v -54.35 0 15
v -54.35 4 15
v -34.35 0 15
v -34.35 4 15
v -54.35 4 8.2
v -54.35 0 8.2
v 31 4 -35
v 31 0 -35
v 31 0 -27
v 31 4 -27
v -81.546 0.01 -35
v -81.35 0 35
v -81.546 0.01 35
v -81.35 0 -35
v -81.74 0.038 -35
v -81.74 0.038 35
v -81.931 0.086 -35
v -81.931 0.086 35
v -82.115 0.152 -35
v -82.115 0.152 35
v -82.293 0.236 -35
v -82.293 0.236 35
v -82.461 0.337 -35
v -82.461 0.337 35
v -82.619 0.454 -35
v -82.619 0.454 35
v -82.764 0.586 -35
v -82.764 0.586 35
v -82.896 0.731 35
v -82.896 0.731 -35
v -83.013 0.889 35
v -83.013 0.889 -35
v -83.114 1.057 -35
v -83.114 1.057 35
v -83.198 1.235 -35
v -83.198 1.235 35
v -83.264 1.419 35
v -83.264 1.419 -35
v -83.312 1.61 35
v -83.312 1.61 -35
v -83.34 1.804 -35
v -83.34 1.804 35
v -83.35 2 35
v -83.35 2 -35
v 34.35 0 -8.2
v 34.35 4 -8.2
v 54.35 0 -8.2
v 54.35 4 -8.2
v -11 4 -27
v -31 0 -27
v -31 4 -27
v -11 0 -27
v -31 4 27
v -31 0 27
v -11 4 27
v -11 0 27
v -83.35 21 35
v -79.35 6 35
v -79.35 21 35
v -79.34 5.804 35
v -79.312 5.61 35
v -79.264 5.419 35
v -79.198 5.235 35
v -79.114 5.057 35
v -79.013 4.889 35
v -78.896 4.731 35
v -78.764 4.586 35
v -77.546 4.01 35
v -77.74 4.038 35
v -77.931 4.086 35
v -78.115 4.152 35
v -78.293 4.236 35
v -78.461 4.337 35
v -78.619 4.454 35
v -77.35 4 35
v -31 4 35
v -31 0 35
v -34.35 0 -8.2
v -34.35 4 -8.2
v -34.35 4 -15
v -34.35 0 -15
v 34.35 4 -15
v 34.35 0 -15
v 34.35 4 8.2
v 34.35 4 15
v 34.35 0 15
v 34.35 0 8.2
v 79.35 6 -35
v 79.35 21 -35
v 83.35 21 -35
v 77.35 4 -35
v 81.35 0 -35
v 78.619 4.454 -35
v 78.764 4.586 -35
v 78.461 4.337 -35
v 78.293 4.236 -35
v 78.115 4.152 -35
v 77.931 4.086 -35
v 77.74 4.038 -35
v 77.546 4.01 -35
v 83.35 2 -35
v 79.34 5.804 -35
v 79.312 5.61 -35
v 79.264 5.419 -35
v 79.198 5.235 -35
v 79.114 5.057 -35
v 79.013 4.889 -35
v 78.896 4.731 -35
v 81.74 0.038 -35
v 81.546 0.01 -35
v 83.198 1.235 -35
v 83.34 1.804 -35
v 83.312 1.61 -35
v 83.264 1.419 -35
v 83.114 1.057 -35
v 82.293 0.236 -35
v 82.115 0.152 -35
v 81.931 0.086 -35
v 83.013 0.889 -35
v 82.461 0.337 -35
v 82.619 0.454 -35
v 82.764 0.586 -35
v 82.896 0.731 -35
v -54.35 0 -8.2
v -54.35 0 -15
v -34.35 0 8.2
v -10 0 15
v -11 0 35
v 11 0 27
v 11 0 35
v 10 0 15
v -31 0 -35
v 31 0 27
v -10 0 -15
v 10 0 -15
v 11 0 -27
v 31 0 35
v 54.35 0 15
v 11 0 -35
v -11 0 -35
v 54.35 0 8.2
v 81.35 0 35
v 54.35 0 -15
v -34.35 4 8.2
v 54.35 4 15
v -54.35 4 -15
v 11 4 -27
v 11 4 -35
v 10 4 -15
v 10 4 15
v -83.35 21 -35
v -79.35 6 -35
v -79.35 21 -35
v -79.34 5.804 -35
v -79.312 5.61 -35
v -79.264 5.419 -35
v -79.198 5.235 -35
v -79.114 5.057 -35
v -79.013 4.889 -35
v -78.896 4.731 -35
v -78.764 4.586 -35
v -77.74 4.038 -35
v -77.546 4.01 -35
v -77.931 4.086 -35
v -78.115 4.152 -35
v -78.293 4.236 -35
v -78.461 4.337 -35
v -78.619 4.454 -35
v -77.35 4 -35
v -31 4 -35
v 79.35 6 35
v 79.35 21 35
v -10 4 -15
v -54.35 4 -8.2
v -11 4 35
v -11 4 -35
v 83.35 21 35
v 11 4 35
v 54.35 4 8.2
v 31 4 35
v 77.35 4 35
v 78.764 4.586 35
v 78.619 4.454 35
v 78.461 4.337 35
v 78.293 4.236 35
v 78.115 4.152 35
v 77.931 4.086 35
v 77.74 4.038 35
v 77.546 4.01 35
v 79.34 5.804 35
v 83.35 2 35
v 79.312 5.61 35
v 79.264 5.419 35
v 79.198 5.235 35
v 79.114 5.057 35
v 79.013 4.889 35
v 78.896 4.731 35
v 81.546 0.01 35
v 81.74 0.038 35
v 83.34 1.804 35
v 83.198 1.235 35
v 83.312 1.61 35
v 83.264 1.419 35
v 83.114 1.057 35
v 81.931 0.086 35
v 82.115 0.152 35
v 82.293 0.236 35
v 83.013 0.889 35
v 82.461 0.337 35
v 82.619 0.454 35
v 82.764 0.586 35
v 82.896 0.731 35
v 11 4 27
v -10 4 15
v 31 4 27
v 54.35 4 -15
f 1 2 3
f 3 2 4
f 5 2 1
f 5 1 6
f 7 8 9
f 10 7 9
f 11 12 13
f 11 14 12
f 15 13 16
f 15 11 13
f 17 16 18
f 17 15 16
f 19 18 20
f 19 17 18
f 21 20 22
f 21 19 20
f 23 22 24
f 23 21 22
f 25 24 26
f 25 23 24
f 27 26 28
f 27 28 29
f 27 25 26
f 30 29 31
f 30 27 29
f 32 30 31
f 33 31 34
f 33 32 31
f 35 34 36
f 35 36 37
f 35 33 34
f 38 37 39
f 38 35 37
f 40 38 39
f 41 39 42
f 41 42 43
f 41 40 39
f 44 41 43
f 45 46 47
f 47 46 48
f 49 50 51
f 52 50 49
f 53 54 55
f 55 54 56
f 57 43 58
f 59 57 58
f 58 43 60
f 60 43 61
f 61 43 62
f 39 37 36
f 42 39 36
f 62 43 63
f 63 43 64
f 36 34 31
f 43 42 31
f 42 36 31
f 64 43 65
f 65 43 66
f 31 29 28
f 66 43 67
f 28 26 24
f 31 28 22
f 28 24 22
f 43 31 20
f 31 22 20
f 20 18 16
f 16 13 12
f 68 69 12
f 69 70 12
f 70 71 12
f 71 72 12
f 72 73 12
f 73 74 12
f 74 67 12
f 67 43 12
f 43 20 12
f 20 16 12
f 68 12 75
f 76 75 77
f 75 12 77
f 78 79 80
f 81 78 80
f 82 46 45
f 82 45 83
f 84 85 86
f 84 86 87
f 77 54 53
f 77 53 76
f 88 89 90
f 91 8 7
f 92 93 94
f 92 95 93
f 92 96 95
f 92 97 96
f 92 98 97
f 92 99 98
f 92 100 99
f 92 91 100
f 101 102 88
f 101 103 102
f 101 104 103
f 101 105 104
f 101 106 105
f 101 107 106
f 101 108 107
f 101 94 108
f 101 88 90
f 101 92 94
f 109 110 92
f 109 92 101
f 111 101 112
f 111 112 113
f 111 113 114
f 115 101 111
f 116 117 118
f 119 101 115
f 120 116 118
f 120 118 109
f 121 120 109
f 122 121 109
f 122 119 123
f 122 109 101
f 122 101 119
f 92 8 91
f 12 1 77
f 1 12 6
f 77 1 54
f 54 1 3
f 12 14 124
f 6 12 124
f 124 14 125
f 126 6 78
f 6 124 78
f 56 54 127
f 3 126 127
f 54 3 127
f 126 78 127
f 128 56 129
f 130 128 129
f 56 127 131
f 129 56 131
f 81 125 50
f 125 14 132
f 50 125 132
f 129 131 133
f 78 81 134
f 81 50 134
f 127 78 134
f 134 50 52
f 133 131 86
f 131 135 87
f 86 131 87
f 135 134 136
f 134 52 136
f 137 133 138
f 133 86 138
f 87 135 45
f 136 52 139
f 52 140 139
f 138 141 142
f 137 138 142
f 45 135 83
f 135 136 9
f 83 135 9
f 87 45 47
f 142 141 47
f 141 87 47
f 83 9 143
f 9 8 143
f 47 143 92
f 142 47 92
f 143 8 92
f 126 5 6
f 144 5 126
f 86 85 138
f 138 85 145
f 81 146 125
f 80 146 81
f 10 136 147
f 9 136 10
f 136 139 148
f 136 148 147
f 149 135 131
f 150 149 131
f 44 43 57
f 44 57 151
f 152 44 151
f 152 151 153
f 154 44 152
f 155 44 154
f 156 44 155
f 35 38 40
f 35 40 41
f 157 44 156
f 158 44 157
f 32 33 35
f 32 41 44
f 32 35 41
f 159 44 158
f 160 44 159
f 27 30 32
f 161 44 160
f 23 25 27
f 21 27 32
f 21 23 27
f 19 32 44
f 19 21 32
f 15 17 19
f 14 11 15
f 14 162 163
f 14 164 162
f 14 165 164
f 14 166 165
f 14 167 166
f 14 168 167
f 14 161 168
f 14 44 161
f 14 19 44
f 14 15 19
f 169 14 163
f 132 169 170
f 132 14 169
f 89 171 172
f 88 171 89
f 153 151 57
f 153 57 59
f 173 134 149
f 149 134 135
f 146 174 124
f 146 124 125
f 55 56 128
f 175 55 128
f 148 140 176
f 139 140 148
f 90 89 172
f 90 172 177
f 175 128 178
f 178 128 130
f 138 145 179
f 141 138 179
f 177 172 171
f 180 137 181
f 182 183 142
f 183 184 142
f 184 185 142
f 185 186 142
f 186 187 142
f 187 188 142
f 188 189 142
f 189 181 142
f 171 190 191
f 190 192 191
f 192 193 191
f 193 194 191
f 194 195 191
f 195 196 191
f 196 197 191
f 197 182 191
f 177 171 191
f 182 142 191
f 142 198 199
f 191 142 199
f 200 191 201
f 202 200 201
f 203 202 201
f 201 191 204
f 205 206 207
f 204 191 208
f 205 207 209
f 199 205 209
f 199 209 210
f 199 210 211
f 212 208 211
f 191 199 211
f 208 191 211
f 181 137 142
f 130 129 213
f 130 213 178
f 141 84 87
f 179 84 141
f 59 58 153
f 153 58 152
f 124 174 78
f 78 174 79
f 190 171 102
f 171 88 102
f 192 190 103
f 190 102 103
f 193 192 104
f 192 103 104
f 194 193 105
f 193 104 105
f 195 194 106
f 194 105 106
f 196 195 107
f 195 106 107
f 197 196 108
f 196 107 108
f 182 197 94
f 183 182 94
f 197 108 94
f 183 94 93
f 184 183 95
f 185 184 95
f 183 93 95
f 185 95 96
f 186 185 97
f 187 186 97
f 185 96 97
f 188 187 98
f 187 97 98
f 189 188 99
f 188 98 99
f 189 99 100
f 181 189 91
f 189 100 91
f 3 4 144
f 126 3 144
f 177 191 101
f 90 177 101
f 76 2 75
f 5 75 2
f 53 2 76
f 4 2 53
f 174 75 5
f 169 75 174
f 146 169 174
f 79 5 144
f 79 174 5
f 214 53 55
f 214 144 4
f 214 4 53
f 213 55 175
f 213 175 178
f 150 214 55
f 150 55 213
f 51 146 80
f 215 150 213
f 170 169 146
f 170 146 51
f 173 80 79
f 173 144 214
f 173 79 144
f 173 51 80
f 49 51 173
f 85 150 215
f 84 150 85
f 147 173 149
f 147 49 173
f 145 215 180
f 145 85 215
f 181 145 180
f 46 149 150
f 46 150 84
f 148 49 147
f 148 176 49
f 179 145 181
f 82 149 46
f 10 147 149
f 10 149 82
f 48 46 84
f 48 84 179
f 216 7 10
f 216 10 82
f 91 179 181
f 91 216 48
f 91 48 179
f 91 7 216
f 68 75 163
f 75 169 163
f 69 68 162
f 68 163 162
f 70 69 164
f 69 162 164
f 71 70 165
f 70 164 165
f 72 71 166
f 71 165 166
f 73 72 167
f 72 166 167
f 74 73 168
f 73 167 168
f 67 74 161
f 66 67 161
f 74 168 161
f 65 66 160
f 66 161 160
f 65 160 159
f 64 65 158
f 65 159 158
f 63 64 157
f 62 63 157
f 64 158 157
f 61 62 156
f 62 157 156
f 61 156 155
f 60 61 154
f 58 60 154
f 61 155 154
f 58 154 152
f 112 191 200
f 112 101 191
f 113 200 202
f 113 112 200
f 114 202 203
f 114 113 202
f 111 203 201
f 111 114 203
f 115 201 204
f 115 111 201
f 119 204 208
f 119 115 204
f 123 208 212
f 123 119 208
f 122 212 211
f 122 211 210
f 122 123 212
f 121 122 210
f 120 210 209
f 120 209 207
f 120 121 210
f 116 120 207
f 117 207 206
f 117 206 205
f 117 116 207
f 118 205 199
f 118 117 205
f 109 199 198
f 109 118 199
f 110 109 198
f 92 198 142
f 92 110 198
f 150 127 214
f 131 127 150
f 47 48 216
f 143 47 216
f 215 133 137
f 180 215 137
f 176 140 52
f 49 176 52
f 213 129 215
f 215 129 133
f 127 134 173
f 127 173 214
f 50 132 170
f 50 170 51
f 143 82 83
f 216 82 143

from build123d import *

# Parameters (mm, degrees)
SKETCH1_W           = 166.7
SKETCH1_H           = 70
BOSS_EXTRUDE1_DEPTH = 4
SKETCH2_W           = 4
SKETCH2_H           = 70
BOSS_EXTRUDE2_DEPTH = 17
SKETCH3_W           = 20
SKETCH3_H           = 6.8
CUT_EXTRUDE1_DEPTH  = 92.984903653
SKETCH4_W           = 20
SKETCH4_H           = 30
CUT_EXTRUDE2_DEPTH  = 93.807448516
FILLET1_R           = 2
SKETCH5_W           = 20
SKETCH5_H           = 8
CUT_EXTRUDE3_DEPTH  = 93.807448516


with BuildPart() as part:
    # Sketch1 → Boss-Extrude1 (new body)
    with BuildSketch(Plane(origin=(0, 0, 0), x_dir=(1, 0, 0), z_dir=(0, 1, 0))):
        Rectangle(SKETCH1_W, SKETCH1_H)
    extrude(amount=BOSS_EXTRUDE1_DEPTH)

    # Sketch2 → Boss-Extrude2 (add)
    with BuildSketch(Plane(origin=(0, 4, 0), x_dir=(1, 0, 0), z_dir=(0, 1, 0))):
        with Locations((81.35, 0)):
            Rectangle(SKETCH2_W, SKETCH2_H)
        with Locations((-81.35, 0)):
            Rectangle(SKETCH2_W, SKETCH2_H)
    extrude(amount=BOSS_EXTRUDE2_DEPTH)

    # Sketch3 → Cut-Extrude1 (cut, through all)
    with BuildSketch(Plane(origin=(0, 4, 0), x_dir=(1, 0, 0), z_dir=(0, 1, 0))):
        with Locations((-44.35, 11.6)):
            Rectangle(SKETCH3_W, SKETCH3_H)
        with Locations((-44.35, -11.6)):
            Rectangle(SKETCH3_W, SKETCH3_H)
        with Locations((44.35, -11.6)):
            Rectangle(SKETCH3_W, SKETCH3_H)
        with Locations((44.35, 11.6)):
            Rectangle(SKETCH3_W, SKETCH3_H)
    extrude(amount=-CUT_EXTRUDE1_DEPTH, mode=Mode.SUBTRACT)

    # Sketch4 → Cut-Extrude2 (cut, through all)
    with BuildSketch(Plane.XZ):
        Rectangle(SKETCH4_W, SKETCH4_H)
    extrude(amount=-CUT_EXTRUDE2_DEPTH, mode=Mode.SUBTRACT)

    # Fillet1
    fillet1_edges = [part.edges().sort_by_distance(p)[0] for p in [
        (79.35, 4, 0),
        (-79.35, 4, 0),
        (-83.35, 0, 0),
        (83.35, 0, 0),
    ]]
    fillet(fillet1_edges, radius=FILLET1_R)

    # Sketch5 → Cut-Extrude3 (cut, through all)
    with BuildSketch(Plane.XZ):
        with Locations((-21, -31)):
            Rectangle(SKETCH5_W, SKETCH5_H)
        with Locations((-21, 31)):
            Rectangle(SKETCH5_W, SKETCH5_H)
        with Locations((21, 31)):
            Rectangle(SKETCH5_W, SKETCH5_H)
        with Locations((21, -31)):
            Rectangle(SKETCH5_W, SKETCH5_H)
    extrude(amount=-CUT_EXTRUDE3_DEPTH, mode=Mode.SUBTRACT)


solid = part.part
